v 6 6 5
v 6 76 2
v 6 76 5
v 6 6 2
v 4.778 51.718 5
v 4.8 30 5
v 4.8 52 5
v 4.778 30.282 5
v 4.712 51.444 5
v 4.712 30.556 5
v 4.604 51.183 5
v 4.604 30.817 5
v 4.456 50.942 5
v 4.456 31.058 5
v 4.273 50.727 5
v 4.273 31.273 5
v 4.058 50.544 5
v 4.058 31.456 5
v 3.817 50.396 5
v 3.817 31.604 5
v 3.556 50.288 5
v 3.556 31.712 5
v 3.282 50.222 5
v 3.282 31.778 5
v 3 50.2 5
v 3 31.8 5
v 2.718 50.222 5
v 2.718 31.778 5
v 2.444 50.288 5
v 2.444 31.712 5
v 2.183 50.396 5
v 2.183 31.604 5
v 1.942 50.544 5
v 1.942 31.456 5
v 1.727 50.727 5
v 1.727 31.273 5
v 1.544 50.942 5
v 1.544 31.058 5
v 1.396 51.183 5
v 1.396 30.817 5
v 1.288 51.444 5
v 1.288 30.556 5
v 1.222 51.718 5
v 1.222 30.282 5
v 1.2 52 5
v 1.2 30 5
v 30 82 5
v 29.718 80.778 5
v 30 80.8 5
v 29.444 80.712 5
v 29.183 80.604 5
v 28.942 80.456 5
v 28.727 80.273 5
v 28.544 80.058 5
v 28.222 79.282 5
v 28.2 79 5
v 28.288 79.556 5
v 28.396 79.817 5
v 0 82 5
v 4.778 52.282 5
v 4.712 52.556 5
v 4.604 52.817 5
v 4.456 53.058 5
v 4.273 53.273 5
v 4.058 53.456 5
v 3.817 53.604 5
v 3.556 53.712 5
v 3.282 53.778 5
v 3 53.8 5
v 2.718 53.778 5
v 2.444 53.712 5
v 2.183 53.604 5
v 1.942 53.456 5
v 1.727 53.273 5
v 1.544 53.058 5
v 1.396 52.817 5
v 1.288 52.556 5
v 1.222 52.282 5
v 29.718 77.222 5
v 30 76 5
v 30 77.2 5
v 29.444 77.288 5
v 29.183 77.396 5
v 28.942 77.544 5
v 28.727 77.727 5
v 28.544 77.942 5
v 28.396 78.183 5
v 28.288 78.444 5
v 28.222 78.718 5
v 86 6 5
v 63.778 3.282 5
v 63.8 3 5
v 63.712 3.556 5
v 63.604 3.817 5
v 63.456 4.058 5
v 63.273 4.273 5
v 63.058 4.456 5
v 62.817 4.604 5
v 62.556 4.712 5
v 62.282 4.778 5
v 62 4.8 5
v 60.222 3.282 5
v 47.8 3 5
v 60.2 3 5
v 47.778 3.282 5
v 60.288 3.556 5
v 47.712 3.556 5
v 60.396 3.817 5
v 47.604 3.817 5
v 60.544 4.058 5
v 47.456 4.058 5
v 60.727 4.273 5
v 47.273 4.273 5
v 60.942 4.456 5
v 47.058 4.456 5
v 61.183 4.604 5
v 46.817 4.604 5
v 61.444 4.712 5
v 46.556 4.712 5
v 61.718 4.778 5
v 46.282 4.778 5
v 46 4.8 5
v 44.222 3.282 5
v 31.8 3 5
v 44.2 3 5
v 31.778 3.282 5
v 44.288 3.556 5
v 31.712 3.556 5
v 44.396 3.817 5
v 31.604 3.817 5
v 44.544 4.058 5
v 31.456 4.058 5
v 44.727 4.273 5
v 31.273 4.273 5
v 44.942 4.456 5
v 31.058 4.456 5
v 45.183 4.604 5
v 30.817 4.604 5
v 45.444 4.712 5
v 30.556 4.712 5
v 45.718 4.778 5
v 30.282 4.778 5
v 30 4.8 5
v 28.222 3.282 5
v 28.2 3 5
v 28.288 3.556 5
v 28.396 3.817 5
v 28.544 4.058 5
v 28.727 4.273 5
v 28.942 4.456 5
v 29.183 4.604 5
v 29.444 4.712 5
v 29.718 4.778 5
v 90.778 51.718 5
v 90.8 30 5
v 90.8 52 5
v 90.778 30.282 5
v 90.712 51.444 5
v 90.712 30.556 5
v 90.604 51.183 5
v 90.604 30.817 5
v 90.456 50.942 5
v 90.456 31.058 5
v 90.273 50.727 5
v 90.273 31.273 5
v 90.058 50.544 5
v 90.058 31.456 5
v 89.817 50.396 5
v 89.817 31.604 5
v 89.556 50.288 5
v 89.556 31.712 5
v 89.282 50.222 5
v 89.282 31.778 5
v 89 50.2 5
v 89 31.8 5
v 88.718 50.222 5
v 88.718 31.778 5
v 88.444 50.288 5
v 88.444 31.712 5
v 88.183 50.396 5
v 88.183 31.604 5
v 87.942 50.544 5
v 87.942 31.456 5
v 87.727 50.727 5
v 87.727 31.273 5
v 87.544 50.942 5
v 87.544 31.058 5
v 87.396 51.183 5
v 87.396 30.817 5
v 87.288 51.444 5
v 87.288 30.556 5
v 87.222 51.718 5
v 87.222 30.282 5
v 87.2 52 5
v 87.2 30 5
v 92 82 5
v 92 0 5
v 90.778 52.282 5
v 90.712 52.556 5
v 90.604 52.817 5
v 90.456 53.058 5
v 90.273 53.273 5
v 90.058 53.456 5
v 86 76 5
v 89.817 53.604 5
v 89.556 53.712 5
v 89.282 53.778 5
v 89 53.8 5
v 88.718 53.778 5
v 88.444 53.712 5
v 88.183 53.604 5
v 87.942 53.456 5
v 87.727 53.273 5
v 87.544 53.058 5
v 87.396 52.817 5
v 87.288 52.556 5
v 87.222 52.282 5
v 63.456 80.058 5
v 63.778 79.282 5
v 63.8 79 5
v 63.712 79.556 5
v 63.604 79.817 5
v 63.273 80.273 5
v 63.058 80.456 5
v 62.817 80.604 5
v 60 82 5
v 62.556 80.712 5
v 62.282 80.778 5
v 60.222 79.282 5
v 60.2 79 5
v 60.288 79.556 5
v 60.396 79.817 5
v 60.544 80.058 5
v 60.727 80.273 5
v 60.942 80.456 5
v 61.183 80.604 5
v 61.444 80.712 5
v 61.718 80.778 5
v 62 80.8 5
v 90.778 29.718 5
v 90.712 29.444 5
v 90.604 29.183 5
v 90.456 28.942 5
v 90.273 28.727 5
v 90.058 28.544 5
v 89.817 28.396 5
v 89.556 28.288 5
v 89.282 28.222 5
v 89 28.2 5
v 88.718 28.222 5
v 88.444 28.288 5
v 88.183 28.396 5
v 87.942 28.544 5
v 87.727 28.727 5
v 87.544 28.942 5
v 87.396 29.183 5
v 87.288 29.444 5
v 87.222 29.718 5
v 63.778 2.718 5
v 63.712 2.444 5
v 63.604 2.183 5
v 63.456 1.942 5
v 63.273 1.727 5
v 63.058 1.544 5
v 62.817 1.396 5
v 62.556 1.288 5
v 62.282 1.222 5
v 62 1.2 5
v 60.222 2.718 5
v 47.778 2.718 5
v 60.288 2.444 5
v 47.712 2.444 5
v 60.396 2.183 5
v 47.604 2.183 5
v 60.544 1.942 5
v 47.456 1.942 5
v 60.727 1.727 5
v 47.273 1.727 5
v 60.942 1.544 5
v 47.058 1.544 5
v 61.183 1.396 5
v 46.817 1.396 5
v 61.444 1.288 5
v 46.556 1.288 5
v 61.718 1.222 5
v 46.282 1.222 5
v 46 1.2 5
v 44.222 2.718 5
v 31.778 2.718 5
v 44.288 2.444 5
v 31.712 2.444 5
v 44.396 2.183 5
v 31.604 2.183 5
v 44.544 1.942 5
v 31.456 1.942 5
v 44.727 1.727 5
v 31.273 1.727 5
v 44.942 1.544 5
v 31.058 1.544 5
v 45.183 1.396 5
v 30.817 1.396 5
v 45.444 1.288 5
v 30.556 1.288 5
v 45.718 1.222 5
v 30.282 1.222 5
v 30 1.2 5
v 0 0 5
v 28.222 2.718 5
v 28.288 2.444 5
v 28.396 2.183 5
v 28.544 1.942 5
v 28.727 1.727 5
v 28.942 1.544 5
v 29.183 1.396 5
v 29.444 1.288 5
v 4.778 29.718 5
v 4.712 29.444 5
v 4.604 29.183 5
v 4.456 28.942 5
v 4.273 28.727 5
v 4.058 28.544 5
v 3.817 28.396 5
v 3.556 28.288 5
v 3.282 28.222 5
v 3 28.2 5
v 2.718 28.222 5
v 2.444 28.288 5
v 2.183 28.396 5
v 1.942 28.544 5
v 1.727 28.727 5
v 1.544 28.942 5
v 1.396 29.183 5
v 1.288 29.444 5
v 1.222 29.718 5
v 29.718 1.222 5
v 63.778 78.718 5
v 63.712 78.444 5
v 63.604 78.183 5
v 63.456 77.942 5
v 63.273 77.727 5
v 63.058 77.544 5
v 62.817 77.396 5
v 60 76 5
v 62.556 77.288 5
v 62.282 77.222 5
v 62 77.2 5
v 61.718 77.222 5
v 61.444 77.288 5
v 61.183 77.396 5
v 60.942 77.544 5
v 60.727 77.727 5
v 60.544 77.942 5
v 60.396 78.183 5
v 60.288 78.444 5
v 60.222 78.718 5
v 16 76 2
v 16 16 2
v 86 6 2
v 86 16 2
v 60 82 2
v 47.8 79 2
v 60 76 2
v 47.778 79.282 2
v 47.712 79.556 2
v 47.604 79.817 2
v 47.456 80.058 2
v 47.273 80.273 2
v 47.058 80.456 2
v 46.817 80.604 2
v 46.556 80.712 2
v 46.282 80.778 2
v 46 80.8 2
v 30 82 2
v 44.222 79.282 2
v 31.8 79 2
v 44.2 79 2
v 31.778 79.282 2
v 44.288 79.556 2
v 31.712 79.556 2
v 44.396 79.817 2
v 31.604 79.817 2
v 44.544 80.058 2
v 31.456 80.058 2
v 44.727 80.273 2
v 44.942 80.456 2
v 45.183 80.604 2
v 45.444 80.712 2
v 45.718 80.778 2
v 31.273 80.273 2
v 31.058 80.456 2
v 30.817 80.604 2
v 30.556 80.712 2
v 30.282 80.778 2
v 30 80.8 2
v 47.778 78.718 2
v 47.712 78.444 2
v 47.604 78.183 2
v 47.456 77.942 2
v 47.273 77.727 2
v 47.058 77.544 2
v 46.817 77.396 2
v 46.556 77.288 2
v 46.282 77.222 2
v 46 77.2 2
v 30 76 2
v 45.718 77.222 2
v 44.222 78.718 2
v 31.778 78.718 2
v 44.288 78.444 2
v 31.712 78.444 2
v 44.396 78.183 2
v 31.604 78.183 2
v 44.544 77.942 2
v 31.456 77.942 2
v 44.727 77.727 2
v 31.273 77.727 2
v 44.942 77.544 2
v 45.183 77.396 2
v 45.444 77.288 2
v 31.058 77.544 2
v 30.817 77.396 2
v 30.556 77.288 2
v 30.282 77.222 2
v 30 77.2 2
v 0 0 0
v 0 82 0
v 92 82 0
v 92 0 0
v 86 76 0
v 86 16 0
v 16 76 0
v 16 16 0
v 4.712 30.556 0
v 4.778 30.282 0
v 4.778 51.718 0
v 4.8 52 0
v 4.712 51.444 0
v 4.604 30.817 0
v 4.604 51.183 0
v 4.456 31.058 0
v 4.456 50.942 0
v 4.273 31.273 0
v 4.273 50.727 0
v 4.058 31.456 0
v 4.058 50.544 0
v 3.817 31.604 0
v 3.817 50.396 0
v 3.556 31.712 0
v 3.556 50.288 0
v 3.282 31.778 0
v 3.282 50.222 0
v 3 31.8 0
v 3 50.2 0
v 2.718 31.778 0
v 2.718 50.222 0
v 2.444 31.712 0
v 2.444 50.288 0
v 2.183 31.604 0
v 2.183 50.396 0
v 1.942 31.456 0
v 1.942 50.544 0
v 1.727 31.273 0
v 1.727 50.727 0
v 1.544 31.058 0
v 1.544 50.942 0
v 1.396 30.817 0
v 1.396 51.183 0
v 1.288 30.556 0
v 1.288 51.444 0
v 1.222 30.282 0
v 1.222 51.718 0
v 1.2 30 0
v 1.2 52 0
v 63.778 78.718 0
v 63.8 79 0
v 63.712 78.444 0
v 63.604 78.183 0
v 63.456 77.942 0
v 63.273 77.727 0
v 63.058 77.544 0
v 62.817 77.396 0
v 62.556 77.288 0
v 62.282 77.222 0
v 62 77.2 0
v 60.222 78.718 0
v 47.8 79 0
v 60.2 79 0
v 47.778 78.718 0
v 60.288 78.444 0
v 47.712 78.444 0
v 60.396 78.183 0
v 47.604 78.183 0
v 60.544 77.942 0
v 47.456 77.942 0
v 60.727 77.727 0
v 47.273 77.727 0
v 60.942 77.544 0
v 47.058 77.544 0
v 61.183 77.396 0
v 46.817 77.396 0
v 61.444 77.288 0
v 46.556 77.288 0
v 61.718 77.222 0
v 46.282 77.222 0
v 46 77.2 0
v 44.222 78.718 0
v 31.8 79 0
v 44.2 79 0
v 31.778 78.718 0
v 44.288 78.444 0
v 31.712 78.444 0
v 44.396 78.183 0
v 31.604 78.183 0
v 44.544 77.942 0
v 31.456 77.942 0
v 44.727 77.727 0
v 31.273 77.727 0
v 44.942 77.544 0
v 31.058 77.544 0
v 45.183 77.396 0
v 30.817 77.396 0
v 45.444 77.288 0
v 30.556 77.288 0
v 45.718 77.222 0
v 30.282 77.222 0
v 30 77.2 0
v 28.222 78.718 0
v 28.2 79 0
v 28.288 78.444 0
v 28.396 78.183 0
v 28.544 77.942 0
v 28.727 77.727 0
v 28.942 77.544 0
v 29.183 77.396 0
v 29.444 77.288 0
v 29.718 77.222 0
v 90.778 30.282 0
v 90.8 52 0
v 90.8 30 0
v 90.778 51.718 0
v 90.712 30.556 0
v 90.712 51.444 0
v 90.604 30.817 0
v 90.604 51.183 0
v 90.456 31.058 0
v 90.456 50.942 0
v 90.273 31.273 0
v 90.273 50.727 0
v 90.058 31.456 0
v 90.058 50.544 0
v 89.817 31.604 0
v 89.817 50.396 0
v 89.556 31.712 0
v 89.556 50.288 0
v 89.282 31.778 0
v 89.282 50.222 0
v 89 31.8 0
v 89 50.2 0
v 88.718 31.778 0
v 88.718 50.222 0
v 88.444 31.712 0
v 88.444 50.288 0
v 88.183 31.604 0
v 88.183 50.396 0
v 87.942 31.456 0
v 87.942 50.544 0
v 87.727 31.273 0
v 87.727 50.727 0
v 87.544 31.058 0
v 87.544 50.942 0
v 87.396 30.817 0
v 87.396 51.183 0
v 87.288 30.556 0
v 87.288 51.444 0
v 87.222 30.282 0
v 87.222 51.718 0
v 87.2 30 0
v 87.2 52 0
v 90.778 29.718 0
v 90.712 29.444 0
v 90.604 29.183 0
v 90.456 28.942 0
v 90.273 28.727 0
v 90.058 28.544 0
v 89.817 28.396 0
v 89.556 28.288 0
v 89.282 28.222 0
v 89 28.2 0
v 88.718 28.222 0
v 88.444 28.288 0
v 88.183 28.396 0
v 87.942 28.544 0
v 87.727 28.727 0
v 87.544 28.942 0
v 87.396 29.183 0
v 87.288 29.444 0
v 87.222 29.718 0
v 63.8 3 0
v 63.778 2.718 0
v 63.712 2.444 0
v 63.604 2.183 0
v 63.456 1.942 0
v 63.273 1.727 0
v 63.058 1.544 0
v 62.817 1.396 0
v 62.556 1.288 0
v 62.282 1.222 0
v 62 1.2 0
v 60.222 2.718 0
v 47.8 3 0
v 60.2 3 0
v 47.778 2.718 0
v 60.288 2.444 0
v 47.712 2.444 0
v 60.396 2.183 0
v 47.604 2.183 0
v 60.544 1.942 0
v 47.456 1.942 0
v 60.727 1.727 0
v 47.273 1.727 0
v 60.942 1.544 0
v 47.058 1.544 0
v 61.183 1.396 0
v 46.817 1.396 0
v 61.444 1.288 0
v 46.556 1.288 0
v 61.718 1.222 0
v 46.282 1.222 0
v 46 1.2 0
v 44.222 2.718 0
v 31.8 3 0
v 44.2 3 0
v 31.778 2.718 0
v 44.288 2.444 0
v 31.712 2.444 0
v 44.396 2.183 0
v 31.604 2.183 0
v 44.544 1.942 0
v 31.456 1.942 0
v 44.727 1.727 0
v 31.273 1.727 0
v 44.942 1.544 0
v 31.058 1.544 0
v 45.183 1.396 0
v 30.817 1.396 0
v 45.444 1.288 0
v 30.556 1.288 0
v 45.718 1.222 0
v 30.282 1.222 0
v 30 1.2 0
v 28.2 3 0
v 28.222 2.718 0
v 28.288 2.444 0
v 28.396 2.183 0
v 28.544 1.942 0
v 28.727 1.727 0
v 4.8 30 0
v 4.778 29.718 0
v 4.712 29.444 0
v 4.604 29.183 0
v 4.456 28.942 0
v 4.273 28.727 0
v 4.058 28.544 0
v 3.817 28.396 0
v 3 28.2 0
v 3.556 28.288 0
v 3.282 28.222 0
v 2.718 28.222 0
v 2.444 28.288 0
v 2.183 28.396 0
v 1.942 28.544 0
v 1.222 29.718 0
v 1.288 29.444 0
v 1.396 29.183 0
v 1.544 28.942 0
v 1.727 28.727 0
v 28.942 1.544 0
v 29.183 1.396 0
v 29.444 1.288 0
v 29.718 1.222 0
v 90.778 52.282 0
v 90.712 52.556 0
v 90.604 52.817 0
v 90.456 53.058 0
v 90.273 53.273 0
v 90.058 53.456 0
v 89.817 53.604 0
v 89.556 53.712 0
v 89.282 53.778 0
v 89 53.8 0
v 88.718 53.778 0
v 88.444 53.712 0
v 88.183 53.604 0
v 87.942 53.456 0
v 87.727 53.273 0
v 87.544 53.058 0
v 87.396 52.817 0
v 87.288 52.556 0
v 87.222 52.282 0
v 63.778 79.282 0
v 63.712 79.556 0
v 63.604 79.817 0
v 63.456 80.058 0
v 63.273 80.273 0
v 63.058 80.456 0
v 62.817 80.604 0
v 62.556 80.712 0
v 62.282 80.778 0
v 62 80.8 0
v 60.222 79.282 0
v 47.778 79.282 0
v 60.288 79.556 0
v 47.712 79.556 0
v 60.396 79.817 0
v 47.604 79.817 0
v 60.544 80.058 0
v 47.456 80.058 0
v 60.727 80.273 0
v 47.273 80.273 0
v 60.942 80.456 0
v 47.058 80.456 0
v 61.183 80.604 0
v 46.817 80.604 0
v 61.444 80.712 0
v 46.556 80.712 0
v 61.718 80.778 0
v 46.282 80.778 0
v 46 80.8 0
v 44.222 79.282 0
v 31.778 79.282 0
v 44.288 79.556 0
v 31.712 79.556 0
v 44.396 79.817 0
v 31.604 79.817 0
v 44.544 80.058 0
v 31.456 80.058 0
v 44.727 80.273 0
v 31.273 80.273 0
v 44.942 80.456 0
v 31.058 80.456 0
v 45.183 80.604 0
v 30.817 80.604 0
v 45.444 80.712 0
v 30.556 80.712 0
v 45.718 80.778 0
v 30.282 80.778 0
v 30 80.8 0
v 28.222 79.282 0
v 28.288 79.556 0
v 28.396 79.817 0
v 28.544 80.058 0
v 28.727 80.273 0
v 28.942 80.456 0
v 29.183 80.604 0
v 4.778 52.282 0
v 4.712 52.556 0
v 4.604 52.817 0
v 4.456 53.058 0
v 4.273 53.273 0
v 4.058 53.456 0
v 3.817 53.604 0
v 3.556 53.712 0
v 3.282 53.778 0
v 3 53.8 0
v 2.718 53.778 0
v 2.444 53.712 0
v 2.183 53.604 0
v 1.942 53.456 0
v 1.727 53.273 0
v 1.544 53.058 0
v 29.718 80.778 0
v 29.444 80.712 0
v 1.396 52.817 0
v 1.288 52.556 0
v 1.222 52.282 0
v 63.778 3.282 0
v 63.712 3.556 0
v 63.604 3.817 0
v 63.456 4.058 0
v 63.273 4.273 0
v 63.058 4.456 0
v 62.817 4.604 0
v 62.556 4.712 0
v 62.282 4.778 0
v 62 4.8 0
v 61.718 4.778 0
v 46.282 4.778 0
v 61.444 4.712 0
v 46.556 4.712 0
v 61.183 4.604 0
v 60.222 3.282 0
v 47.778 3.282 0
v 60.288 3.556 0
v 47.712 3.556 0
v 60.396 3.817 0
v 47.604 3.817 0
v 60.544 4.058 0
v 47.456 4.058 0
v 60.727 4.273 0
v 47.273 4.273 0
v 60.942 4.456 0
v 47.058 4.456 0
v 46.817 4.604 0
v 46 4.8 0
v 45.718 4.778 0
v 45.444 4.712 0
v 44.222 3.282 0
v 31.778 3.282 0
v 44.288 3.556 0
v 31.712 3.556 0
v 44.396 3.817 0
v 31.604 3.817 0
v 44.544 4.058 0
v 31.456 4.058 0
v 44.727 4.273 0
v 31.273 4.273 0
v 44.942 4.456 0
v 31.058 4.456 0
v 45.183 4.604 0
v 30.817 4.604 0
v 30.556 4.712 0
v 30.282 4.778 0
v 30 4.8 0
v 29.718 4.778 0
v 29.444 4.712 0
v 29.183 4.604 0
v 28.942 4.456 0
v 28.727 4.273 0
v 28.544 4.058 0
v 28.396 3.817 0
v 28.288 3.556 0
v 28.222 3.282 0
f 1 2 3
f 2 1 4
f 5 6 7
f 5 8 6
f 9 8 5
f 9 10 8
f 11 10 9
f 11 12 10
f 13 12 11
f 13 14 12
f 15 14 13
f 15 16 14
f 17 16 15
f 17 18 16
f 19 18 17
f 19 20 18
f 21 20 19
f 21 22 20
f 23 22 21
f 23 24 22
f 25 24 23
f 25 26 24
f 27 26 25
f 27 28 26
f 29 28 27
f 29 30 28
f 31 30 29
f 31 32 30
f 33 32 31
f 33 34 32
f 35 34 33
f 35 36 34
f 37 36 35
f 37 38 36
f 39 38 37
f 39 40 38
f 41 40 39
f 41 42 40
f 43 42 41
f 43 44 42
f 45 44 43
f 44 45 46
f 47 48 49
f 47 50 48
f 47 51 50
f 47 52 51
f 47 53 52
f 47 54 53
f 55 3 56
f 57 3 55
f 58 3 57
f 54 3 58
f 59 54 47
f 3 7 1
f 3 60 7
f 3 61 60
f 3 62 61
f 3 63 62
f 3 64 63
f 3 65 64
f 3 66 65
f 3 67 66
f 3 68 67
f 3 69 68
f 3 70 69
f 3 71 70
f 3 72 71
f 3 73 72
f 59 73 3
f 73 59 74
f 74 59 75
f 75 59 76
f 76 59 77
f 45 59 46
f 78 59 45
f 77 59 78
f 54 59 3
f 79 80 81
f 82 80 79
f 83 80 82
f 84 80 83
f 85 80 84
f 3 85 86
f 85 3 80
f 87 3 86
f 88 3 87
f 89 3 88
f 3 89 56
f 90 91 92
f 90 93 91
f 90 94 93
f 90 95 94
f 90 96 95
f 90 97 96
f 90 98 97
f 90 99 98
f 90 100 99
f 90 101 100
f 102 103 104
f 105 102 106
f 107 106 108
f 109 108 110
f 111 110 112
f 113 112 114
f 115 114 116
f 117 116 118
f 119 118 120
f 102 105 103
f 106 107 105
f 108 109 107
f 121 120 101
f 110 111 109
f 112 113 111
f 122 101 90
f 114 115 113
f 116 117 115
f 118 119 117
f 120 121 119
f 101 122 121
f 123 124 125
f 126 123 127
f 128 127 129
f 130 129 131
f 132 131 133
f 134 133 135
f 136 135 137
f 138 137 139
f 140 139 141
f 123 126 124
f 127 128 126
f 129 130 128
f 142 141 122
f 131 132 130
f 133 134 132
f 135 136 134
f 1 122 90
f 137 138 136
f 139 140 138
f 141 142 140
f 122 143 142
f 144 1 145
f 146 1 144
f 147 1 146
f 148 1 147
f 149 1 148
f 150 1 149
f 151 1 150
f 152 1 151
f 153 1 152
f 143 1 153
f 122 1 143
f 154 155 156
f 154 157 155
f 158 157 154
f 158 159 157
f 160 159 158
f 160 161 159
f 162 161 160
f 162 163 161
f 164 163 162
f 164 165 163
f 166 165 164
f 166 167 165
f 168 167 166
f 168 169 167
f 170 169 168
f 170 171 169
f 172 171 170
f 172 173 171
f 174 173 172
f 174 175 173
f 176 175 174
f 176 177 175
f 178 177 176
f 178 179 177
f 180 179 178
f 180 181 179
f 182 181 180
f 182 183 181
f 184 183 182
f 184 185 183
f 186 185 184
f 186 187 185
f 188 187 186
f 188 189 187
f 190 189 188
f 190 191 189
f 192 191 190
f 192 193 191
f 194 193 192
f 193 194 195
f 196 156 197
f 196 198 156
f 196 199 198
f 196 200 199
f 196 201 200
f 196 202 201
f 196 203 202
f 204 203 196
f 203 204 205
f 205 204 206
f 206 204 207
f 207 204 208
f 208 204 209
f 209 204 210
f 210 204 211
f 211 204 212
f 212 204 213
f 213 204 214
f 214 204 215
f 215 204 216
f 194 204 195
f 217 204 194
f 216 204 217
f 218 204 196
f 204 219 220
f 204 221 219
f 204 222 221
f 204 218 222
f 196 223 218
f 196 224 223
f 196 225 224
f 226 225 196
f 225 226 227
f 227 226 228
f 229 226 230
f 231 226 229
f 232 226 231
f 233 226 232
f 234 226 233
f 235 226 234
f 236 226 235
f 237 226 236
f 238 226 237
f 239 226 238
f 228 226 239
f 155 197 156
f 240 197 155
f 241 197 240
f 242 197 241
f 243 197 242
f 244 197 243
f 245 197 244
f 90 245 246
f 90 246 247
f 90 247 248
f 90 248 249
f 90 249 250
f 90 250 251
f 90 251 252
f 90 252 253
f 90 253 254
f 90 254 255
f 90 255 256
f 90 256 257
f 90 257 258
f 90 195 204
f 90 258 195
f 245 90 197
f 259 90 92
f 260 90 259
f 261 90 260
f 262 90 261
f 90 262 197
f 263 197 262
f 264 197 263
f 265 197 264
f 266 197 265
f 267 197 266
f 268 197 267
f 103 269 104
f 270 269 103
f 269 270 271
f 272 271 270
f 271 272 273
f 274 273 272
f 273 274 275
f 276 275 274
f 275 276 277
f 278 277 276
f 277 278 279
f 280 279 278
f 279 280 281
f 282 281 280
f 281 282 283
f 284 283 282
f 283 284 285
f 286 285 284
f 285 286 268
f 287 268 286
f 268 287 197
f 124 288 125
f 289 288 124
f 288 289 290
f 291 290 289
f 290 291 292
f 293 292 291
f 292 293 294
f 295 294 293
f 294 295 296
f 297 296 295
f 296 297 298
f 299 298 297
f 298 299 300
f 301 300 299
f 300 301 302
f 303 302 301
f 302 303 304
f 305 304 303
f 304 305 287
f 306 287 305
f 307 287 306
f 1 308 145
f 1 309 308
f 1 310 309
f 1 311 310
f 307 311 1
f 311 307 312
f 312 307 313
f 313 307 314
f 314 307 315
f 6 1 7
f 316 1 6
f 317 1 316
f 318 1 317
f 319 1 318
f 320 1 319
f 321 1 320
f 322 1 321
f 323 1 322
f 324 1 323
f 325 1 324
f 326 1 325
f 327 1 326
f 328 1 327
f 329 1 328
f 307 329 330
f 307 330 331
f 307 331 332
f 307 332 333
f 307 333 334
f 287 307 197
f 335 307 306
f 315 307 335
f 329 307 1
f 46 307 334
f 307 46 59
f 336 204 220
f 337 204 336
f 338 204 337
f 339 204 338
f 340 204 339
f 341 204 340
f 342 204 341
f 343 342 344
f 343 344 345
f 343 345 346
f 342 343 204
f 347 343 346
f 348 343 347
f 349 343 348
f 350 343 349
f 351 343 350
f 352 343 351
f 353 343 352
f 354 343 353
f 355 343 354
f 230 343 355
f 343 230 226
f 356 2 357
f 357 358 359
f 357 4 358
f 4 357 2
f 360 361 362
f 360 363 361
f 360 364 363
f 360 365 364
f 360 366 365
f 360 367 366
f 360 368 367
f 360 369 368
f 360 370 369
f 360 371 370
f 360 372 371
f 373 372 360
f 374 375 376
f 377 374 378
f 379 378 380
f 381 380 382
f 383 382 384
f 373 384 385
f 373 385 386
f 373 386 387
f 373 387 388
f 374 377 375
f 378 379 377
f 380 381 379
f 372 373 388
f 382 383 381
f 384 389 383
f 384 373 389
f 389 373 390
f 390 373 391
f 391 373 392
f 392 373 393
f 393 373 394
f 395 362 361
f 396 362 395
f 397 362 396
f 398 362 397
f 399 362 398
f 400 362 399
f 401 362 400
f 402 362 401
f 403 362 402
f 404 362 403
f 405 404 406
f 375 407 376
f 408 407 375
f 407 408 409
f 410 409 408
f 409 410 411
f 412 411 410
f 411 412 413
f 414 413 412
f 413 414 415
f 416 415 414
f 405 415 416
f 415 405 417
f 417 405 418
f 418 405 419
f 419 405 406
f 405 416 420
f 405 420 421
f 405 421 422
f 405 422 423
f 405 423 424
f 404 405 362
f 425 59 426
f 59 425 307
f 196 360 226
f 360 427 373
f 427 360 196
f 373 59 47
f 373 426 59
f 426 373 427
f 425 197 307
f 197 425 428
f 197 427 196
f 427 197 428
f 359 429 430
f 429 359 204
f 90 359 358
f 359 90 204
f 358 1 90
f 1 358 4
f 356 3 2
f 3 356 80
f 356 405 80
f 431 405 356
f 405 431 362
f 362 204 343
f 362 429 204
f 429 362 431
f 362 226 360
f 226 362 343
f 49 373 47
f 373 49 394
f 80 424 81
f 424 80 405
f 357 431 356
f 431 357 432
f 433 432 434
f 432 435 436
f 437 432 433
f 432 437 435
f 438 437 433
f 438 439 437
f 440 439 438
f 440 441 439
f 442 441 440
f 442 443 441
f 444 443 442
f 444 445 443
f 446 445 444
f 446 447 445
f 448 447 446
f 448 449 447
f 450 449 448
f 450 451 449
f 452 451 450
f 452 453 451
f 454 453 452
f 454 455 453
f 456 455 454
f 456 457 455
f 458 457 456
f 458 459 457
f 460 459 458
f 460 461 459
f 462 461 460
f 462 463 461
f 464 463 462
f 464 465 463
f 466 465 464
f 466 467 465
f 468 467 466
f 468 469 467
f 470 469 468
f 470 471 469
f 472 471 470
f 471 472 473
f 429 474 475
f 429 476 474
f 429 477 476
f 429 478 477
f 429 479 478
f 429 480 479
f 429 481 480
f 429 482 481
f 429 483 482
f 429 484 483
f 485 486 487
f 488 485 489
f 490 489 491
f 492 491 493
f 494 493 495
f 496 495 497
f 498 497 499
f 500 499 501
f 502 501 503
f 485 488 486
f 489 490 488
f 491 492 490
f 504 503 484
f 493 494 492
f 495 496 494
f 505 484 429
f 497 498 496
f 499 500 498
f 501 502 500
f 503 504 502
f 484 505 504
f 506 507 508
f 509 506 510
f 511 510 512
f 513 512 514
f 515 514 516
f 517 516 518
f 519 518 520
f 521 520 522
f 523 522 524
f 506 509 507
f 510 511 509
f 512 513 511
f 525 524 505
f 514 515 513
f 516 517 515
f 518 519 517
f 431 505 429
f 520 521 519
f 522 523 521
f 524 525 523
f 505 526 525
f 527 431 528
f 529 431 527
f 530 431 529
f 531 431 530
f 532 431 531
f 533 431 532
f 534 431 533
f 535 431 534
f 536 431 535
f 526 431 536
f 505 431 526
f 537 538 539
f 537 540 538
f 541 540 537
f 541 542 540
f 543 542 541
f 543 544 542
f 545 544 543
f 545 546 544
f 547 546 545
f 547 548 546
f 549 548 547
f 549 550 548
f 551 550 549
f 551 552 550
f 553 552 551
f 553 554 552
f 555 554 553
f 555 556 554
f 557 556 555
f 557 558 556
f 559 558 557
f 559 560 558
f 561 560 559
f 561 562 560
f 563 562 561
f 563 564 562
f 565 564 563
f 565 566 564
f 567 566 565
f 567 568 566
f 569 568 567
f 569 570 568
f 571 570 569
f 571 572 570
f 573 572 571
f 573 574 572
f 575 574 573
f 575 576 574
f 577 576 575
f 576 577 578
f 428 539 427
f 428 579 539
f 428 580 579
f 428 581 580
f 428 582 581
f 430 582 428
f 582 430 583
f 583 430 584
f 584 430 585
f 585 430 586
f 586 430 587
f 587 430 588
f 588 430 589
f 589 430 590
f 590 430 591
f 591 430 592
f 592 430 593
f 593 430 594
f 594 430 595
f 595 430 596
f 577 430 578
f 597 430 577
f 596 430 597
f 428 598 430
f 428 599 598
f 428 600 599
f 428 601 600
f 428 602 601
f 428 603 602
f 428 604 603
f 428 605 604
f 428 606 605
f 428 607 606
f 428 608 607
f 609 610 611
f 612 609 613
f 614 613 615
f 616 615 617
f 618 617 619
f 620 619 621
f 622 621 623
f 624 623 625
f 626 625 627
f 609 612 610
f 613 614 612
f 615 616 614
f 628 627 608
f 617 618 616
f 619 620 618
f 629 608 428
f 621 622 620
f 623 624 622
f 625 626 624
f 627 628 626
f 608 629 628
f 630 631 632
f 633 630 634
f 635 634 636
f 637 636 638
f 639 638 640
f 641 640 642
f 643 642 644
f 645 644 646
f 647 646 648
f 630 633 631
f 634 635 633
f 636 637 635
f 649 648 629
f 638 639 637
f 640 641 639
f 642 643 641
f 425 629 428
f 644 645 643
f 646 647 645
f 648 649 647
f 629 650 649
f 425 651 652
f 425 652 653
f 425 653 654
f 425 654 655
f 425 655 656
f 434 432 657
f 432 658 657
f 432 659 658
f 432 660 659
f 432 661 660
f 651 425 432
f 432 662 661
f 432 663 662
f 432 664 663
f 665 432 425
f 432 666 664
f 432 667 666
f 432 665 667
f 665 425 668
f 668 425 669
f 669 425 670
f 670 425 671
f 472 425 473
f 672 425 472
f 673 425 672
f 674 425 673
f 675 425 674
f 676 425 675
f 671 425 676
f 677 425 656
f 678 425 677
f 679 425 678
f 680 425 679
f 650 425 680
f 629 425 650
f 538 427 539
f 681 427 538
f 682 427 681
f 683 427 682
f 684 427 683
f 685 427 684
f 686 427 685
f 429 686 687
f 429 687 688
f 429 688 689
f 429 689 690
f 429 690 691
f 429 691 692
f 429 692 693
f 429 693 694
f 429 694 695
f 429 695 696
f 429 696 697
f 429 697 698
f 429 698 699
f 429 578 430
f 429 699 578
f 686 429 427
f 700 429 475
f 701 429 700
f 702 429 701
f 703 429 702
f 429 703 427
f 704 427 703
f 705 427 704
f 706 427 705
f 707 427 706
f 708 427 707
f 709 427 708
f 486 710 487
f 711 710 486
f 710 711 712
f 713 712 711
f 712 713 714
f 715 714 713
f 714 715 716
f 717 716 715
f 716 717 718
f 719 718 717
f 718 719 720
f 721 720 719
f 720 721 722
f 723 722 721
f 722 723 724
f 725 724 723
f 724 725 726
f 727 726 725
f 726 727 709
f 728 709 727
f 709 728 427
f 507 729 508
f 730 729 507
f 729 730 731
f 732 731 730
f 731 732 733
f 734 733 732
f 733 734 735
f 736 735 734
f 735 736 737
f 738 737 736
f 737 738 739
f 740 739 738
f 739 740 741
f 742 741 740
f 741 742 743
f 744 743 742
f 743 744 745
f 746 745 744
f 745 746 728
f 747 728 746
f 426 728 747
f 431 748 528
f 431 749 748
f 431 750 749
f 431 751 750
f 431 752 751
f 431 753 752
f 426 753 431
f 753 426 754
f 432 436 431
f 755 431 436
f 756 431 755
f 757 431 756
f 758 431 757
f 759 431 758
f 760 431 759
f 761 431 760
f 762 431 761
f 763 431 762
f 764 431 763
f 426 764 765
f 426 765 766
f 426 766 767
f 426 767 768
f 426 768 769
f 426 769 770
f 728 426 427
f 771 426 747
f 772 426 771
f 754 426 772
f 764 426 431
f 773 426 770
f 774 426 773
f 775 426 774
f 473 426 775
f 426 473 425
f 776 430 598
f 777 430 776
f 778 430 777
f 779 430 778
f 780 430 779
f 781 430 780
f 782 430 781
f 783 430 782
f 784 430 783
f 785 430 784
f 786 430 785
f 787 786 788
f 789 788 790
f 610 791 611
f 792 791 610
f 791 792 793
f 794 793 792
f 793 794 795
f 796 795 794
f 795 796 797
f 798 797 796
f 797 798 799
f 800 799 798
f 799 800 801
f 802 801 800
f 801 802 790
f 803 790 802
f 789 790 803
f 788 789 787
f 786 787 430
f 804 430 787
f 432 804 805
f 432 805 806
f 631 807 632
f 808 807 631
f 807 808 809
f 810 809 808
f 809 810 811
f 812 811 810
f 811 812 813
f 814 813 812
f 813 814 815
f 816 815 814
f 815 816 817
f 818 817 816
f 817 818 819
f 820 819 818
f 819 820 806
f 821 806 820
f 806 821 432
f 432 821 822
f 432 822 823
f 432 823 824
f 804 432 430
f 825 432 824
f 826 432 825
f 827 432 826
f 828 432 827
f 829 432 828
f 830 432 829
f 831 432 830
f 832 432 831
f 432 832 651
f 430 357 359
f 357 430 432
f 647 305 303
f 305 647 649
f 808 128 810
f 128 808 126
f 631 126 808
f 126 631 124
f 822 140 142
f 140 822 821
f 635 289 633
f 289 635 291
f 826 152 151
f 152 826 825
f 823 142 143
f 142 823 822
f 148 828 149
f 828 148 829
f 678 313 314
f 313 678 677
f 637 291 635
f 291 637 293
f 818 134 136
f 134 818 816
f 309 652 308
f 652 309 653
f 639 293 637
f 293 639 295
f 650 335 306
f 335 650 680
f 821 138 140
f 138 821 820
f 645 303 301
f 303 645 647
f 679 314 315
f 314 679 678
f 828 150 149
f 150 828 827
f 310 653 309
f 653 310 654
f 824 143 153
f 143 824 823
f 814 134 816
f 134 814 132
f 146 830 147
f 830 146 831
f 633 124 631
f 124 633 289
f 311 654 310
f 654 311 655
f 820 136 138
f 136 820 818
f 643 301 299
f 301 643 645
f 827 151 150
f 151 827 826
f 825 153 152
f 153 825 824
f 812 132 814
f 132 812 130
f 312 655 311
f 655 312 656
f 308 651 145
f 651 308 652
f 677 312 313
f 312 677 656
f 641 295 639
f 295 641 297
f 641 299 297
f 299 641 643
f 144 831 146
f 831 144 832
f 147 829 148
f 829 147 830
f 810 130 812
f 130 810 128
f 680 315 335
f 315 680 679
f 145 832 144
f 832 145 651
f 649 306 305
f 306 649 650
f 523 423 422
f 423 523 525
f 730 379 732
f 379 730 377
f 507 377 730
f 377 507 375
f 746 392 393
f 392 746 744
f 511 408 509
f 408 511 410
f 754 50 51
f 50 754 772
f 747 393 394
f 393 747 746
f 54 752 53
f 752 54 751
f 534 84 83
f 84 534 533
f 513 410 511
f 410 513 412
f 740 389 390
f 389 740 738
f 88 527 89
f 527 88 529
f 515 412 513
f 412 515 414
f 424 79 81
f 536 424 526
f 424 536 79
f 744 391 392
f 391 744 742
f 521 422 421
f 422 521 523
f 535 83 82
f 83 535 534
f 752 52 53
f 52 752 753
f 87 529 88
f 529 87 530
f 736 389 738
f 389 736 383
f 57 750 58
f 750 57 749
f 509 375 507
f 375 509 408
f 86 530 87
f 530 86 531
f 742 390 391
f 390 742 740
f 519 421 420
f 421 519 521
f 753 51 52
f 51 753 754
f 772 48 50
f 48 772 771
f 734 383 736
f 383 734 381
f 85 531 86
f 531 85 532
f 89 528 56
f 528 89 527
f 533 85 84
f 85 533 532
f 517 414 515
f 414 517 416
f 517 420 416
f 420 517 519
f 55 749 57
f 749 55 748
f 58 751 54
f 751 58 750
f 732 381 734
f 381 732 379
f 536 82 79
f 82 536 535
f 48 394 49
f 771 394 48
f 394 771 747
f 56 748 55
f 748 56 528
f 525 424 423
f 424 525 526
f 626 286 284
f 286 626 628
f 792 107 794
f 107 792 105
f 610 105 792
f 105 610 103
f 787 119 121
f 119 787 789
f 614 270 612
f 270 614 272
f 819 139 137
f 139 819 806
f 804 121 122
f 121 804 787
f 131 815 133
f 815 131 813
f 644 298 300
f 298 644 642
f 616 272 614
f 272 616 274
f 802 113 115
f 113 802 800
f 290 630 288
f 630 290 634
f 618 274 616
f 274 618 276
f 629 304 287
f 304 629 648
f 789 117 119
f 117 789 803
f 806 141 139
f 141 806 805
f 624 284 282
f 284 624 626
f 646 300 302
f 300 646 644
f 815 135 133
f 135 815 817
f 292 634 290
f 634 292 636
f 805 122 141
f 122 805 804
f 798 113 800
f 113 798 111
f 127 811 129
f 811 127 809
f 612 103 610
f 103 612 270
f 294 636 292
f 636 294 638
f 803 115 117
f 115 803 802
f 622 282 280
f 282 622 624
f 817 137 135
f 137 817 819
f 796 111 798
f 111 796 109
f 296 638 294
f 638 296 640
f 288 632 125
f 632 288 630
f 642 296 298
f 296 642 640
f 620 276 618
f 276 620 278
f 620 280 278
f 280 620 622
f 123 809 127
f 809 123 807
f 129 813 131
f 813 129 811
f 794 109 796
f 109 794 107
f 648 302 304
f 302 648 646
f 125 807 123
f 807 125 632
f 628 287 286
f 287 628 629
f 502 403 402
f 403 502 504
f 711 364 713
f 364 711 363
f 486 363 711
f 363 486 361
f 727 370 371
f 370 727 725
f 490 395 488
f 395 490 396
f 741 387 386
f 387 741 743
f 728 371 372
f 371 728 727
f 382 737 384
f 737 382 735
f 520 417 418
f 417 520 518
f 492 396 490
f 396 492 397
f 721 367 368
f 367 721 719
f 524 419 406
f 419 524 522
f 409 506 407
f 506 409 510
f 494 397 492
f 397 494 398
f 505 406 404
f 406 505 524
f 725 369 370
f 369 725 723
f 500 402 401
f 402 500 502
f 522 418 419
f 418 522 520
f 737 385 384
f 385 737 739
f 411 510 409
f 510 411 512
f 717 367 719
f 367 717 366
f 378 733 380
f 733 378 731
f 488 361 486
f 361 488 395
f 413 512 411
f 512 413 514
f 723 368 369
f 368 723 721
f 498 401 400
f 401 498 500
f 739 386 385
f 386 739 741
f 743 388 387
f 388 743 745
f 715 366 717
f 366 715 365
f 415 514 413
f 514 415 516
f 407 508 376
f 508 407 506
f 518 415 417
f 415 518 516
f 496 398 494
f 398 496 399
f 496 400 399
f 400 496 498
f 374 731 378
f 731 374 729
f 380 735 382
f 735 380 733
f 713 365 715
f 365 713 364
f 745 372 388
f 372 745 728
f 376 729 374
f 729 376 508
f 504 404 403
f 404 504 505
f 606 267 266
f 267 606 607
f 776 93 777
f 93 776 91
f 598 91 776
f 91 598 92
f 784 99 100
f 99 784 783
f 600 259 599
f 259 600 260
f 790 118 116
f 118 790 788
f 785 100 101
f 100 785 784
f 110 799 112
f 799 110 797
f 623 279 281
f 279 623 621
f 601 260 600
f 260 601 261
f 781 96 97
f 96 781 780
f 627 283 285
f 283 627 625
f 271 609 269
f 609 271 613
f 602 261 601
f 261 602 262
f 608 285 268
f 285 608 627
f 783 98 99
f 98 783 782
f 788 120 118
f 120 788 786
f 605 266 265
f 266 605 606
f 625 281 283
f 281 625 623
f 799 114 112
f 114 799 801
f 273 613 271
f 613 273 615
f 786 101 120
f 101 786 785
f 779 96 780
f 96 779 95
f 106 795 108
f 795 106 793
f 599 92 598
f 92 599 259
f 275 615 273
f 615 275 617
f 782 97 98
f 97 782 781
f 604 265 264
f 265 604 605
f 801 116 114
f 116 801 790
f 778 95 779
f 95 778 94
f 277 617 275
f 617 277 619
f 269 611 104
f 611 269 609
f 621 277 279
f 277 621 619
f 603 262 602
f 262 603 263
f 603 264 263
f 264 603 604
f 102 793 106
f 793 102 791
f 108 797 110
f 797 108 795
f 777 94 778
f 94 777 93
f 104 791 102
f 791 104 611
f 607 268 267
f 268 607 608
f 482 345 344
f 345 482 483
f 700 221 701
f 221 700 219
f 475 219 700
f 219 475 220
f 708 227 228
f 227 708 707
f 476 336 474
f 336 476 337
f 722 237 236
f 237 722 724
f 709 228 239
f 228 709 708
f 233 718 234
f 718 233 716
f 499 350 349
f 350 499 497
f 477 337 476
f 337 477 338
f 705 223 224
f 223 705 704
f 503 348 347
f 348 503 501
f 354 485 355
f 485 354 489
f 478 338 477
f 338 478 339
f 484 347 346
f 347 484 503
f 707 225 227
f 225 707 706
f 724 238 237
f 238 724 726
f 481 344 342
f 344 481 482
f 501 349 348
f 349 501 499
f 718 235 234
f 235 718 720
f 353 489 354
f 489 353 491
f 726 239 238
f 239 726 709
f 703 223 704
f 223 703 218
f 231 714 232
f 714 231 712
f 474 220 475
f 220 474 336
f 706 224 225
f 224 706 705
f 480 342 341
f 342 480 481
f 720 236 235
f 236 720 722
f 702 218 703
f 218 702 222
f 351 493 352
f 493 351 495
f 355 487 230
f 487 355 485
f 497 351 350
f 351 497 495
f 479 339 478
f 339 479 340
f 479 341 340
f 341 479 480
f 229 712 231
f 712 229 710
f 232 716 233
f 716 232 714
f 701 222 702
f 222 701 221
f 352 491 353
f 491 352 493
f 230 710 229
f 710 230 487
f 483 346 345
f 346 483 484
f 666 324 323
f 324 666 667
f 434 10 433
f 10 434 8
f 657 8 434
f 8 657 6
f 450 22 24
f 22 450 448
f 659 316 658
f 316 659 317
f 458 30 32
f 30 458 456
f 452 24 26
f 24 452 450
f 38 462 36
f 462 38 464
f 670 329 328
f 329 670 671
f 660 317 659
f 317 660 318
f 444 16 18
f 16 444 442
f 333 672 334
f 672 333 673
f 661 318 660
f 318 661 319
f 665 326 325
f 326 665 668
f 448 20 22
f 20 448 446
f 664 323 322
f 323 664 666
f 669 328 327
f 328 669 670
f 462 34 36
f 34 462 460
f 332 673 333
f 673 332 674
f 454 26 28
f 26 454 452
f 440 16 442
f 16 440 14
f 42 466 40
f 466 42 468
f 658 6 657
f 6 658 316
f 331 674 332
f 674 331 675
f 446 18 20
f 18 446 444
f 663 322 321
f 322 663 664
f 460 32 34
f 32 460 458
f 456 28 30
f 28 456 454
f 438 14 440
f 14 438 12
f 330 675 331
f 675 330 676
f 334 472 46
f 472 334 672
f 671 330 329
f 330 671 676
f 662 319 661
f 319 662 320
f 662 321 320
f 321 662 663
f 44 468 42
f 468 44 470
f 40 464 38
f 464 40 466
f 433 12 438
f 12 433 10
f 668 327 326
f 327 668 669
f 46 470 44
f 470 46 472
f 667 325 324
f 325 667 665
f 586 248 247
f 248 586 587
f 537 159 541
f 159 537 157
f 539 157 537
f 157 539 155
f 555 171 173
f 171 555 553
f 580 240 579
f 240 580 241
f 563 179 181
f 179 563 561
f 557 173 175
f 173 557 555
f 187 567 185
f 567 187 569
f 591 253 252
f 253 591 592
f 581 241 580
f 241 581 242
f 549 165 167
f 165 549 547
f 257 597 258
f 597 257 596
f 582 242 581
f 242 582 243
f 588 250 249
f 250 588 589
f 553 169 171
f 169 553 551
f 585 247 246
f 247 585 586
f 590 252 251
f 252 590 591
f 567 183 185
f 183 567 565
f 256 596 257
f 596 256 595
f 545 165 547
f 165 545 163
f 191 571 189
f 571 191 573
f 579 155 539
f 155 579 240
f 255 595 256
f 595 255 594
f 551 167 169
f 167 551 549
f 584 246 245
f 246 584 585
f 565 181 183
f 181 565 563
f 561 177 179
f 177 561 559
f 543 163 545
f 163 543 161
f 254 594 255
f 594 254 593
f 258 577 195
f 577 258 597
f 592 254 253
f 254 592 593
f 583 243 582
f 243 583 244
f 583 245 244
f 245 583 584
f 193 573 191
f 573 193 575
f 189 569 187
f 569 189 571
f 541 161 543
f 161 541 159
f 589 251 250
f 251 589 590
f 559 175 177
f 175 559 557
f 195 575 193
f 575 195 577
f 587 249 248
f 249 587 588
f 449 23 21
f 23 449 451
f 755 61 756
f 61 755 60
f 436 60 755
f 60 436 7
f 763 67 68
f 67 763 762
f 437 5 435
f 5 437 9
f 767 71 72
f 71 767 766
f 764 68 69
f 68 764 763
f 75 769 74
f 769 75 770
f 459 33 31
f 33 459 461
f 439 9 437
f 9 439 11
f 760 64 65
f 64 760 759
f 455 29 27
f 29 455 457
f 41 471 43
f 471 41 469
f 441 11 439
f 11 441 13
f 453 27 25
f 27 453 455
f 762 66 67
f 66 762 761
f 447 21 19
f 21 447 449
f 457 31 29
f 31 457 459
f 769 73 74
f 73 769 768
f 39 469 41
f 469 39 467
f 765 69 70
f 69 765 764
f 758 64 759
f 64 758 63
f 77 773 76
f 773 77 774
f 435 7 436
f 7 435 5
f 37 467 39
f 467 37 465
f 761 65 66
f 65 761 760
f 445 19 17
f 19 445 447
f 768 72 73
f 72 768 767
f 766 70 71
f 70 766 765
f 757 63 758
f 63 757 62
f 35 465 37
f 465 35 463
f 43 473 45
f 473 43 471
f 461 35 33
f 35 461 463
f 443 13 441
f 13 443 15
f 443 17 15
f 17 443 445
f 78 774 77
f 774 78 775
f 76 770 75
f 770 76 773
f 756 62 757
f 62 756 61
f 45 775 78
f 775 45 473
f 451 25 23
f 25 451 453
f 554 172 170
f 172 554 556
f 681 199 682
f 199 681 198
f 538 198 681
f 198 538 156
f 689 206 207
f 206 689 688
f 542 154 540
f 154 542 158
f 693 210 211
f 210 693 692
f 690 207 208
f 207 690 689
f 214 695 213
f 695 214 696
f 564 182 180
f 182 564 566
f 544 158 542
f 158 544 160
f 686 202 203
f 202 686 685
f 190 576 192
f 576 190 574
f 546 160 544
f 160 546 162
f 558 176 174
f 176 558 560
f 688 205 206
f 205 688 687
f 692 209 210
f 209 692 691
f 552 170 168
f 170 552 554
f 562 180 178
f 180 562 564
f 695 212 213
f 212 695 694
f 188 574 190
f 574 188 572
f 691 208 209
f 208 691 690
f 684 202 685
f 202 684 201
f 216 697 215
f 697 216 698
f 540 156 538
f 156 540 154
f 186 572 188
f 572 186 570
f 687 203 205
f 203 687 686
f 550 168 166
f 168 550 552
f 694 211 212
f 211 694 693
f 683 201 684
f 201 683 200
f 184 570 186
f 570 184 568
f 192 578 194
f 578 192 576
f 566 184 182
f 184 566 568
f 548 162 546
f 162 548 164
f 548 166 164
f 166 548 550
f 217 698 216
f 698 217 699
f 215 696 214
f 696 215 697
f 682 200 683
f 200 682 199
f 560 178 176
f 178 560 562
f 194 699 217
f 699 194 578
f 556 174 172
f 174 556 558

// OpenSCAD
// file: ../lib/pcb_led_cvf.scad
// for led power module modified

/* bluetooth_mate_holder.scad
 * By John Biehler - November 17, 2011
 * http://www.thingiverse.com/thing:

 * derived from pcb_box_slide_with_tabs.scad
 * By Nicholas C Lewis - Jan 1, 2011
 * http://www.thingiverse.com/thing:5396
 *
 * derived from pcb_box_slide.scad
 *     Parametric, open PCB-box (slide-in) by chlunde
 *     http://www.thingiverse.com/thing:4071
 *
 * CHANGES
 * - adjusted to fit Arduino Mega
 * - added mounting tabs
 * - turned off cutouts
 * - adjusted bottom cutout size
 */

$fn=50;

module pcb_led_cvf(

	pcb_width = 48.2,
	pcb_length =24.1,
	pcb_height =1.1,
	slisse = 0.8,

	pcb_bottom_margin = 1,
	wall_width_thick = 2,
	box_height = 7,

	//tab parameters
	tab_hole_radius=2,
	tab_outer_radius=4,

	inner_margin = 4,

	add_tabs = true

) {
	wall_width = wall_width_thick-slisse;

module tab() {
	difference(){
		union() {
			translate([-tab_outer_radius,-tab_outer_radius,0])
			cube([tab_outer_radius,2*tab_outer_radius,wall_width_thick+1]);
			translate([-tab_outer_radius,0,0])
				cylinder(r=tab_outer_radius, h = wall_width_thick+1);
		}
		translate([-tab_outer_radius,0,0]) {
			cylinder(r= tab_hole_radius, h = wall_width_thick+5,center=true);
		}
	}

}

module box() {
	union() {
		cube([pcb_width + 2*wall_width, pcb_length + 2*wall_width, wall_width]);

		cube([wall_width_thick, pcb_length + 2*wall_width, box_height]);

		cube([pcb_width + 2*wall_width, wall_width_thick, box_height]);

		%translate([0, pcb_length+wall_width, 0])
			cube([pcb_width + 2*wall_width,wall_width,box_height]);

		translate([pcb_width + wall_width - slisse,0,0])
			cube([wall_width_thick, pcb_length + 2*wall_width, box_height]);
	}
	if(add_tabs) {
//comment out this part to remove tabs
		for(i=[(pcb_length + 2*wall_width)/2]){
	translate([0,i,0])tab();
	translate([pcb_width + 2*wall_width,i,0])mirror()tab();
		}
	}

}

module pcb() {
	translate([wall_width, wall_width, wall_width + pcb_bottom_margin])
		cube([pcb_width,pcb_length + wall_width + 0.1,pcb_height]);
	translate([wall_width, wall_width, wall_width + pcb_bottom_margin+pcb_height])rotate([0,45,0])
		cube([pcb_height,pcb_length + wall_width + 0.1,pcb_height]);
	translate([wall_width+pcb_width-2*cos(45)*pcb_height, wall_width, wall_width + pcb_bottom_margin+pcb_height])rotate([0,45,0])
		cube([pcb_height,pcb_length + wall_width + 0.1,pcb_height]);
	translate([wall_width_thick, wall_width, wall_width + pcb_bottom_margin])
		cube([pcb_width-2*slisse,pcb_length + wall_width + 0.1,box_height]);

}



module holes() {
		*translate([wall_width + pcb_width/2, wall_width_thick + 0.1, pcb_width/2+wall_width])
			rotate(a=90,v=[1,0,0])
				cylinder(r=pcb_width/2, h=wall_width_thick + 0.2);

		*translate([-0.1, wall_width + pcb_length/2, pcb_length/2 + wall_width])
			rotate(a=90,v=[0,1,0])
				cylinder(r=pcb_length/2, h=wall_width_thick + 0.2);

		*translate([pcb_width + wall_width - slisse - 0.1, wall_width + pcb_length/2, pcb_length/2 + wall_width])
			rotate(a=90,v=[0,1,0])
				cylinder(r=pcb_length/2, h=wall_width_thick + 0.2);

	 * translate([pcb_width/2 + wall_width, wall_width + pcb_length/2, -0.1])
			rotate(a=0,v=[0,1,0])
				cylinder(r=min(pcb_length,pcb_width)/2 - wall_width/2, h=wall_width_thick + 0.2);

		translate([inner_margin +wall_width, inner_margin+wall_width, -0.1])
			cube([pcb_width-inner_margin*2,pcb_length -inner_margin*2,wall_width + 0.2]);
}

	difference() {
		box();
		pcb();
		holes();
	}
}



pcb_led_cvf();
// main file
use <../lib/pcb_led_cvf.scad>

$fn = 40;

border_sz = 6;

wall = 2;

tft_module_sz_x = 80;
tft_module_sz_y = 70;
tft_module_sz_z = 3;

tft_hole_sz_x = 70;
tft_hole_sz_y = 60;

tft_field_sz_left = 10;
tft_field_sz_top = 10;
tft_field_sz_right = tft_module_sz_x - tft_hole_sz_x - tft_field_sz_left;
tft_field_sz_bottom = tft_module_sz_y - tft_hole_sz_y - tft_field_sz_top;

cable_space_module_sz_left = 30;
cable_space_sz_x = 30;

x_hole_offset = 30;
y_hole_offset = 30;

hole_d = 2.9;
hole_d_through = 3.6;

controller_pcb_sz_x = 40;
controller_pcb_sz_y = 30;
controller_pcb_sz_z = 2;

controller_pcb_below_sz_z = 3;
controller_pcb_above_sz_z = 10;


module top_cover() {
	difference() {
		union() {
			// first lever - face
			cube([border_sz + tft_field_sz_left, tft_module_sz_y+2*border_sz, wall]);
			translate([border_sz + tft_module_sz_x - tft_field_sz_right, 0, 0]) {
				cube([tft_field_sz_right + border_sz, tft_module_sz_y+2*border_sz, wall]);
			}
			cube([tft_module_sz_x+2*border_sz, border_sz + tft_field_sz_top, wall]);
			translate([0, border_sz + tft_module_sz_y - tft_field_sz_bottom, 0]) {
				cube([tft_module_sz_x+2*border_sz, tft_field_sz_bottom + border_sz, wall]);
			}
			// next lever - border around
			translate([0, 0, wall]) {
				difference() {
					union() {
						cube([border_sz, tft_module_sz_y+2*border_sz, tft_module_sz_z]);
						translate([border_sz + tft_module_sz_x, 0, 0]) {
							cube([border_sz, tft_module_sz_y+2*border_sz, tft_module_sz_z]);
						}
						cube([tft_module_sz_x+2*border_sz, border_sz, tft_module_sz_z]);
						translate([0, border_sz + tft_module_sz_y, 0]) {
							cube([tft_module_sz_x+2*border_sz, border_sz, tft_module_sz_z]);
						}
					}
					// extraction for cable
					translate([cable_space_module_sz_left, border_sz + tft_module_sz_y, 0]) {
						cube([cable_space_sz_x, border_sz, tft_module_sz_z]);
					}
				}
			}
		}
		// border holes along x
		for(x=[0, 0.5, 1]) {
			for(y=[0, 1]) {
				translate([x_hole_offset+x*(tft_module_sz_x+2*border_sz-2*x_hole_offset), 
							border_sz/2+y*(tft_module_sz_y+border_sz), 0]) {
					cylinder(d=hole_d_through, h=50, center=true);
				}
			}
		}
		// border holes along y
		for(y=[0, 1]) {
			for(x=[0, 1]) {
				translate([border_sz/2+x*(tft_module_sz_x+border_sz),
						y_hole_offset+y*(tft_module_sz_y+2*border_sz-2*y_hole_offset), 0]) {
					cylinder(d=hole_d_through, h=50, center=true);
				}
			}
		}
	}
}

module controller_holder() {
	translate([border_sz+tft_module_sz_x/2-controller_pcb_sz_x/2-1.5,
				border_sz+tft_module_sz_y/2-controller_pcb_sz_y/2-1.5, 0]) {
		pcb_led_cvf(
			pcb_length=controller_pcb_sz_x,
			pcb_width=controller_pcb_sz_y,
			pcb_height=controller_pcb_sz_z,
			pcb_bottom_margin=controller_pcb_below_sz_z,
			add_tabs=false
		);
	}
	for(x=[0, 0.5, 1]) {
		translate([x_hole_offset+x*(tft_module_sz_x+2*border_sz-2*x_hole_offset)-5, 0, 0]) {
			cube([10, tft_module_sz_y, wall]);
		}
	}
	for(y=[0, 1]) {
		translate([0, y_hole_offset+y*(tft_module_sz_y+2*border_sz-2*y_hole_offset)-5, 0]) {
			cube([tft_module_sz_x, 10, wall]);
		}
	}
}

top_cover();
translate([0, 0, 10]) {
	//controller_holder();
}
